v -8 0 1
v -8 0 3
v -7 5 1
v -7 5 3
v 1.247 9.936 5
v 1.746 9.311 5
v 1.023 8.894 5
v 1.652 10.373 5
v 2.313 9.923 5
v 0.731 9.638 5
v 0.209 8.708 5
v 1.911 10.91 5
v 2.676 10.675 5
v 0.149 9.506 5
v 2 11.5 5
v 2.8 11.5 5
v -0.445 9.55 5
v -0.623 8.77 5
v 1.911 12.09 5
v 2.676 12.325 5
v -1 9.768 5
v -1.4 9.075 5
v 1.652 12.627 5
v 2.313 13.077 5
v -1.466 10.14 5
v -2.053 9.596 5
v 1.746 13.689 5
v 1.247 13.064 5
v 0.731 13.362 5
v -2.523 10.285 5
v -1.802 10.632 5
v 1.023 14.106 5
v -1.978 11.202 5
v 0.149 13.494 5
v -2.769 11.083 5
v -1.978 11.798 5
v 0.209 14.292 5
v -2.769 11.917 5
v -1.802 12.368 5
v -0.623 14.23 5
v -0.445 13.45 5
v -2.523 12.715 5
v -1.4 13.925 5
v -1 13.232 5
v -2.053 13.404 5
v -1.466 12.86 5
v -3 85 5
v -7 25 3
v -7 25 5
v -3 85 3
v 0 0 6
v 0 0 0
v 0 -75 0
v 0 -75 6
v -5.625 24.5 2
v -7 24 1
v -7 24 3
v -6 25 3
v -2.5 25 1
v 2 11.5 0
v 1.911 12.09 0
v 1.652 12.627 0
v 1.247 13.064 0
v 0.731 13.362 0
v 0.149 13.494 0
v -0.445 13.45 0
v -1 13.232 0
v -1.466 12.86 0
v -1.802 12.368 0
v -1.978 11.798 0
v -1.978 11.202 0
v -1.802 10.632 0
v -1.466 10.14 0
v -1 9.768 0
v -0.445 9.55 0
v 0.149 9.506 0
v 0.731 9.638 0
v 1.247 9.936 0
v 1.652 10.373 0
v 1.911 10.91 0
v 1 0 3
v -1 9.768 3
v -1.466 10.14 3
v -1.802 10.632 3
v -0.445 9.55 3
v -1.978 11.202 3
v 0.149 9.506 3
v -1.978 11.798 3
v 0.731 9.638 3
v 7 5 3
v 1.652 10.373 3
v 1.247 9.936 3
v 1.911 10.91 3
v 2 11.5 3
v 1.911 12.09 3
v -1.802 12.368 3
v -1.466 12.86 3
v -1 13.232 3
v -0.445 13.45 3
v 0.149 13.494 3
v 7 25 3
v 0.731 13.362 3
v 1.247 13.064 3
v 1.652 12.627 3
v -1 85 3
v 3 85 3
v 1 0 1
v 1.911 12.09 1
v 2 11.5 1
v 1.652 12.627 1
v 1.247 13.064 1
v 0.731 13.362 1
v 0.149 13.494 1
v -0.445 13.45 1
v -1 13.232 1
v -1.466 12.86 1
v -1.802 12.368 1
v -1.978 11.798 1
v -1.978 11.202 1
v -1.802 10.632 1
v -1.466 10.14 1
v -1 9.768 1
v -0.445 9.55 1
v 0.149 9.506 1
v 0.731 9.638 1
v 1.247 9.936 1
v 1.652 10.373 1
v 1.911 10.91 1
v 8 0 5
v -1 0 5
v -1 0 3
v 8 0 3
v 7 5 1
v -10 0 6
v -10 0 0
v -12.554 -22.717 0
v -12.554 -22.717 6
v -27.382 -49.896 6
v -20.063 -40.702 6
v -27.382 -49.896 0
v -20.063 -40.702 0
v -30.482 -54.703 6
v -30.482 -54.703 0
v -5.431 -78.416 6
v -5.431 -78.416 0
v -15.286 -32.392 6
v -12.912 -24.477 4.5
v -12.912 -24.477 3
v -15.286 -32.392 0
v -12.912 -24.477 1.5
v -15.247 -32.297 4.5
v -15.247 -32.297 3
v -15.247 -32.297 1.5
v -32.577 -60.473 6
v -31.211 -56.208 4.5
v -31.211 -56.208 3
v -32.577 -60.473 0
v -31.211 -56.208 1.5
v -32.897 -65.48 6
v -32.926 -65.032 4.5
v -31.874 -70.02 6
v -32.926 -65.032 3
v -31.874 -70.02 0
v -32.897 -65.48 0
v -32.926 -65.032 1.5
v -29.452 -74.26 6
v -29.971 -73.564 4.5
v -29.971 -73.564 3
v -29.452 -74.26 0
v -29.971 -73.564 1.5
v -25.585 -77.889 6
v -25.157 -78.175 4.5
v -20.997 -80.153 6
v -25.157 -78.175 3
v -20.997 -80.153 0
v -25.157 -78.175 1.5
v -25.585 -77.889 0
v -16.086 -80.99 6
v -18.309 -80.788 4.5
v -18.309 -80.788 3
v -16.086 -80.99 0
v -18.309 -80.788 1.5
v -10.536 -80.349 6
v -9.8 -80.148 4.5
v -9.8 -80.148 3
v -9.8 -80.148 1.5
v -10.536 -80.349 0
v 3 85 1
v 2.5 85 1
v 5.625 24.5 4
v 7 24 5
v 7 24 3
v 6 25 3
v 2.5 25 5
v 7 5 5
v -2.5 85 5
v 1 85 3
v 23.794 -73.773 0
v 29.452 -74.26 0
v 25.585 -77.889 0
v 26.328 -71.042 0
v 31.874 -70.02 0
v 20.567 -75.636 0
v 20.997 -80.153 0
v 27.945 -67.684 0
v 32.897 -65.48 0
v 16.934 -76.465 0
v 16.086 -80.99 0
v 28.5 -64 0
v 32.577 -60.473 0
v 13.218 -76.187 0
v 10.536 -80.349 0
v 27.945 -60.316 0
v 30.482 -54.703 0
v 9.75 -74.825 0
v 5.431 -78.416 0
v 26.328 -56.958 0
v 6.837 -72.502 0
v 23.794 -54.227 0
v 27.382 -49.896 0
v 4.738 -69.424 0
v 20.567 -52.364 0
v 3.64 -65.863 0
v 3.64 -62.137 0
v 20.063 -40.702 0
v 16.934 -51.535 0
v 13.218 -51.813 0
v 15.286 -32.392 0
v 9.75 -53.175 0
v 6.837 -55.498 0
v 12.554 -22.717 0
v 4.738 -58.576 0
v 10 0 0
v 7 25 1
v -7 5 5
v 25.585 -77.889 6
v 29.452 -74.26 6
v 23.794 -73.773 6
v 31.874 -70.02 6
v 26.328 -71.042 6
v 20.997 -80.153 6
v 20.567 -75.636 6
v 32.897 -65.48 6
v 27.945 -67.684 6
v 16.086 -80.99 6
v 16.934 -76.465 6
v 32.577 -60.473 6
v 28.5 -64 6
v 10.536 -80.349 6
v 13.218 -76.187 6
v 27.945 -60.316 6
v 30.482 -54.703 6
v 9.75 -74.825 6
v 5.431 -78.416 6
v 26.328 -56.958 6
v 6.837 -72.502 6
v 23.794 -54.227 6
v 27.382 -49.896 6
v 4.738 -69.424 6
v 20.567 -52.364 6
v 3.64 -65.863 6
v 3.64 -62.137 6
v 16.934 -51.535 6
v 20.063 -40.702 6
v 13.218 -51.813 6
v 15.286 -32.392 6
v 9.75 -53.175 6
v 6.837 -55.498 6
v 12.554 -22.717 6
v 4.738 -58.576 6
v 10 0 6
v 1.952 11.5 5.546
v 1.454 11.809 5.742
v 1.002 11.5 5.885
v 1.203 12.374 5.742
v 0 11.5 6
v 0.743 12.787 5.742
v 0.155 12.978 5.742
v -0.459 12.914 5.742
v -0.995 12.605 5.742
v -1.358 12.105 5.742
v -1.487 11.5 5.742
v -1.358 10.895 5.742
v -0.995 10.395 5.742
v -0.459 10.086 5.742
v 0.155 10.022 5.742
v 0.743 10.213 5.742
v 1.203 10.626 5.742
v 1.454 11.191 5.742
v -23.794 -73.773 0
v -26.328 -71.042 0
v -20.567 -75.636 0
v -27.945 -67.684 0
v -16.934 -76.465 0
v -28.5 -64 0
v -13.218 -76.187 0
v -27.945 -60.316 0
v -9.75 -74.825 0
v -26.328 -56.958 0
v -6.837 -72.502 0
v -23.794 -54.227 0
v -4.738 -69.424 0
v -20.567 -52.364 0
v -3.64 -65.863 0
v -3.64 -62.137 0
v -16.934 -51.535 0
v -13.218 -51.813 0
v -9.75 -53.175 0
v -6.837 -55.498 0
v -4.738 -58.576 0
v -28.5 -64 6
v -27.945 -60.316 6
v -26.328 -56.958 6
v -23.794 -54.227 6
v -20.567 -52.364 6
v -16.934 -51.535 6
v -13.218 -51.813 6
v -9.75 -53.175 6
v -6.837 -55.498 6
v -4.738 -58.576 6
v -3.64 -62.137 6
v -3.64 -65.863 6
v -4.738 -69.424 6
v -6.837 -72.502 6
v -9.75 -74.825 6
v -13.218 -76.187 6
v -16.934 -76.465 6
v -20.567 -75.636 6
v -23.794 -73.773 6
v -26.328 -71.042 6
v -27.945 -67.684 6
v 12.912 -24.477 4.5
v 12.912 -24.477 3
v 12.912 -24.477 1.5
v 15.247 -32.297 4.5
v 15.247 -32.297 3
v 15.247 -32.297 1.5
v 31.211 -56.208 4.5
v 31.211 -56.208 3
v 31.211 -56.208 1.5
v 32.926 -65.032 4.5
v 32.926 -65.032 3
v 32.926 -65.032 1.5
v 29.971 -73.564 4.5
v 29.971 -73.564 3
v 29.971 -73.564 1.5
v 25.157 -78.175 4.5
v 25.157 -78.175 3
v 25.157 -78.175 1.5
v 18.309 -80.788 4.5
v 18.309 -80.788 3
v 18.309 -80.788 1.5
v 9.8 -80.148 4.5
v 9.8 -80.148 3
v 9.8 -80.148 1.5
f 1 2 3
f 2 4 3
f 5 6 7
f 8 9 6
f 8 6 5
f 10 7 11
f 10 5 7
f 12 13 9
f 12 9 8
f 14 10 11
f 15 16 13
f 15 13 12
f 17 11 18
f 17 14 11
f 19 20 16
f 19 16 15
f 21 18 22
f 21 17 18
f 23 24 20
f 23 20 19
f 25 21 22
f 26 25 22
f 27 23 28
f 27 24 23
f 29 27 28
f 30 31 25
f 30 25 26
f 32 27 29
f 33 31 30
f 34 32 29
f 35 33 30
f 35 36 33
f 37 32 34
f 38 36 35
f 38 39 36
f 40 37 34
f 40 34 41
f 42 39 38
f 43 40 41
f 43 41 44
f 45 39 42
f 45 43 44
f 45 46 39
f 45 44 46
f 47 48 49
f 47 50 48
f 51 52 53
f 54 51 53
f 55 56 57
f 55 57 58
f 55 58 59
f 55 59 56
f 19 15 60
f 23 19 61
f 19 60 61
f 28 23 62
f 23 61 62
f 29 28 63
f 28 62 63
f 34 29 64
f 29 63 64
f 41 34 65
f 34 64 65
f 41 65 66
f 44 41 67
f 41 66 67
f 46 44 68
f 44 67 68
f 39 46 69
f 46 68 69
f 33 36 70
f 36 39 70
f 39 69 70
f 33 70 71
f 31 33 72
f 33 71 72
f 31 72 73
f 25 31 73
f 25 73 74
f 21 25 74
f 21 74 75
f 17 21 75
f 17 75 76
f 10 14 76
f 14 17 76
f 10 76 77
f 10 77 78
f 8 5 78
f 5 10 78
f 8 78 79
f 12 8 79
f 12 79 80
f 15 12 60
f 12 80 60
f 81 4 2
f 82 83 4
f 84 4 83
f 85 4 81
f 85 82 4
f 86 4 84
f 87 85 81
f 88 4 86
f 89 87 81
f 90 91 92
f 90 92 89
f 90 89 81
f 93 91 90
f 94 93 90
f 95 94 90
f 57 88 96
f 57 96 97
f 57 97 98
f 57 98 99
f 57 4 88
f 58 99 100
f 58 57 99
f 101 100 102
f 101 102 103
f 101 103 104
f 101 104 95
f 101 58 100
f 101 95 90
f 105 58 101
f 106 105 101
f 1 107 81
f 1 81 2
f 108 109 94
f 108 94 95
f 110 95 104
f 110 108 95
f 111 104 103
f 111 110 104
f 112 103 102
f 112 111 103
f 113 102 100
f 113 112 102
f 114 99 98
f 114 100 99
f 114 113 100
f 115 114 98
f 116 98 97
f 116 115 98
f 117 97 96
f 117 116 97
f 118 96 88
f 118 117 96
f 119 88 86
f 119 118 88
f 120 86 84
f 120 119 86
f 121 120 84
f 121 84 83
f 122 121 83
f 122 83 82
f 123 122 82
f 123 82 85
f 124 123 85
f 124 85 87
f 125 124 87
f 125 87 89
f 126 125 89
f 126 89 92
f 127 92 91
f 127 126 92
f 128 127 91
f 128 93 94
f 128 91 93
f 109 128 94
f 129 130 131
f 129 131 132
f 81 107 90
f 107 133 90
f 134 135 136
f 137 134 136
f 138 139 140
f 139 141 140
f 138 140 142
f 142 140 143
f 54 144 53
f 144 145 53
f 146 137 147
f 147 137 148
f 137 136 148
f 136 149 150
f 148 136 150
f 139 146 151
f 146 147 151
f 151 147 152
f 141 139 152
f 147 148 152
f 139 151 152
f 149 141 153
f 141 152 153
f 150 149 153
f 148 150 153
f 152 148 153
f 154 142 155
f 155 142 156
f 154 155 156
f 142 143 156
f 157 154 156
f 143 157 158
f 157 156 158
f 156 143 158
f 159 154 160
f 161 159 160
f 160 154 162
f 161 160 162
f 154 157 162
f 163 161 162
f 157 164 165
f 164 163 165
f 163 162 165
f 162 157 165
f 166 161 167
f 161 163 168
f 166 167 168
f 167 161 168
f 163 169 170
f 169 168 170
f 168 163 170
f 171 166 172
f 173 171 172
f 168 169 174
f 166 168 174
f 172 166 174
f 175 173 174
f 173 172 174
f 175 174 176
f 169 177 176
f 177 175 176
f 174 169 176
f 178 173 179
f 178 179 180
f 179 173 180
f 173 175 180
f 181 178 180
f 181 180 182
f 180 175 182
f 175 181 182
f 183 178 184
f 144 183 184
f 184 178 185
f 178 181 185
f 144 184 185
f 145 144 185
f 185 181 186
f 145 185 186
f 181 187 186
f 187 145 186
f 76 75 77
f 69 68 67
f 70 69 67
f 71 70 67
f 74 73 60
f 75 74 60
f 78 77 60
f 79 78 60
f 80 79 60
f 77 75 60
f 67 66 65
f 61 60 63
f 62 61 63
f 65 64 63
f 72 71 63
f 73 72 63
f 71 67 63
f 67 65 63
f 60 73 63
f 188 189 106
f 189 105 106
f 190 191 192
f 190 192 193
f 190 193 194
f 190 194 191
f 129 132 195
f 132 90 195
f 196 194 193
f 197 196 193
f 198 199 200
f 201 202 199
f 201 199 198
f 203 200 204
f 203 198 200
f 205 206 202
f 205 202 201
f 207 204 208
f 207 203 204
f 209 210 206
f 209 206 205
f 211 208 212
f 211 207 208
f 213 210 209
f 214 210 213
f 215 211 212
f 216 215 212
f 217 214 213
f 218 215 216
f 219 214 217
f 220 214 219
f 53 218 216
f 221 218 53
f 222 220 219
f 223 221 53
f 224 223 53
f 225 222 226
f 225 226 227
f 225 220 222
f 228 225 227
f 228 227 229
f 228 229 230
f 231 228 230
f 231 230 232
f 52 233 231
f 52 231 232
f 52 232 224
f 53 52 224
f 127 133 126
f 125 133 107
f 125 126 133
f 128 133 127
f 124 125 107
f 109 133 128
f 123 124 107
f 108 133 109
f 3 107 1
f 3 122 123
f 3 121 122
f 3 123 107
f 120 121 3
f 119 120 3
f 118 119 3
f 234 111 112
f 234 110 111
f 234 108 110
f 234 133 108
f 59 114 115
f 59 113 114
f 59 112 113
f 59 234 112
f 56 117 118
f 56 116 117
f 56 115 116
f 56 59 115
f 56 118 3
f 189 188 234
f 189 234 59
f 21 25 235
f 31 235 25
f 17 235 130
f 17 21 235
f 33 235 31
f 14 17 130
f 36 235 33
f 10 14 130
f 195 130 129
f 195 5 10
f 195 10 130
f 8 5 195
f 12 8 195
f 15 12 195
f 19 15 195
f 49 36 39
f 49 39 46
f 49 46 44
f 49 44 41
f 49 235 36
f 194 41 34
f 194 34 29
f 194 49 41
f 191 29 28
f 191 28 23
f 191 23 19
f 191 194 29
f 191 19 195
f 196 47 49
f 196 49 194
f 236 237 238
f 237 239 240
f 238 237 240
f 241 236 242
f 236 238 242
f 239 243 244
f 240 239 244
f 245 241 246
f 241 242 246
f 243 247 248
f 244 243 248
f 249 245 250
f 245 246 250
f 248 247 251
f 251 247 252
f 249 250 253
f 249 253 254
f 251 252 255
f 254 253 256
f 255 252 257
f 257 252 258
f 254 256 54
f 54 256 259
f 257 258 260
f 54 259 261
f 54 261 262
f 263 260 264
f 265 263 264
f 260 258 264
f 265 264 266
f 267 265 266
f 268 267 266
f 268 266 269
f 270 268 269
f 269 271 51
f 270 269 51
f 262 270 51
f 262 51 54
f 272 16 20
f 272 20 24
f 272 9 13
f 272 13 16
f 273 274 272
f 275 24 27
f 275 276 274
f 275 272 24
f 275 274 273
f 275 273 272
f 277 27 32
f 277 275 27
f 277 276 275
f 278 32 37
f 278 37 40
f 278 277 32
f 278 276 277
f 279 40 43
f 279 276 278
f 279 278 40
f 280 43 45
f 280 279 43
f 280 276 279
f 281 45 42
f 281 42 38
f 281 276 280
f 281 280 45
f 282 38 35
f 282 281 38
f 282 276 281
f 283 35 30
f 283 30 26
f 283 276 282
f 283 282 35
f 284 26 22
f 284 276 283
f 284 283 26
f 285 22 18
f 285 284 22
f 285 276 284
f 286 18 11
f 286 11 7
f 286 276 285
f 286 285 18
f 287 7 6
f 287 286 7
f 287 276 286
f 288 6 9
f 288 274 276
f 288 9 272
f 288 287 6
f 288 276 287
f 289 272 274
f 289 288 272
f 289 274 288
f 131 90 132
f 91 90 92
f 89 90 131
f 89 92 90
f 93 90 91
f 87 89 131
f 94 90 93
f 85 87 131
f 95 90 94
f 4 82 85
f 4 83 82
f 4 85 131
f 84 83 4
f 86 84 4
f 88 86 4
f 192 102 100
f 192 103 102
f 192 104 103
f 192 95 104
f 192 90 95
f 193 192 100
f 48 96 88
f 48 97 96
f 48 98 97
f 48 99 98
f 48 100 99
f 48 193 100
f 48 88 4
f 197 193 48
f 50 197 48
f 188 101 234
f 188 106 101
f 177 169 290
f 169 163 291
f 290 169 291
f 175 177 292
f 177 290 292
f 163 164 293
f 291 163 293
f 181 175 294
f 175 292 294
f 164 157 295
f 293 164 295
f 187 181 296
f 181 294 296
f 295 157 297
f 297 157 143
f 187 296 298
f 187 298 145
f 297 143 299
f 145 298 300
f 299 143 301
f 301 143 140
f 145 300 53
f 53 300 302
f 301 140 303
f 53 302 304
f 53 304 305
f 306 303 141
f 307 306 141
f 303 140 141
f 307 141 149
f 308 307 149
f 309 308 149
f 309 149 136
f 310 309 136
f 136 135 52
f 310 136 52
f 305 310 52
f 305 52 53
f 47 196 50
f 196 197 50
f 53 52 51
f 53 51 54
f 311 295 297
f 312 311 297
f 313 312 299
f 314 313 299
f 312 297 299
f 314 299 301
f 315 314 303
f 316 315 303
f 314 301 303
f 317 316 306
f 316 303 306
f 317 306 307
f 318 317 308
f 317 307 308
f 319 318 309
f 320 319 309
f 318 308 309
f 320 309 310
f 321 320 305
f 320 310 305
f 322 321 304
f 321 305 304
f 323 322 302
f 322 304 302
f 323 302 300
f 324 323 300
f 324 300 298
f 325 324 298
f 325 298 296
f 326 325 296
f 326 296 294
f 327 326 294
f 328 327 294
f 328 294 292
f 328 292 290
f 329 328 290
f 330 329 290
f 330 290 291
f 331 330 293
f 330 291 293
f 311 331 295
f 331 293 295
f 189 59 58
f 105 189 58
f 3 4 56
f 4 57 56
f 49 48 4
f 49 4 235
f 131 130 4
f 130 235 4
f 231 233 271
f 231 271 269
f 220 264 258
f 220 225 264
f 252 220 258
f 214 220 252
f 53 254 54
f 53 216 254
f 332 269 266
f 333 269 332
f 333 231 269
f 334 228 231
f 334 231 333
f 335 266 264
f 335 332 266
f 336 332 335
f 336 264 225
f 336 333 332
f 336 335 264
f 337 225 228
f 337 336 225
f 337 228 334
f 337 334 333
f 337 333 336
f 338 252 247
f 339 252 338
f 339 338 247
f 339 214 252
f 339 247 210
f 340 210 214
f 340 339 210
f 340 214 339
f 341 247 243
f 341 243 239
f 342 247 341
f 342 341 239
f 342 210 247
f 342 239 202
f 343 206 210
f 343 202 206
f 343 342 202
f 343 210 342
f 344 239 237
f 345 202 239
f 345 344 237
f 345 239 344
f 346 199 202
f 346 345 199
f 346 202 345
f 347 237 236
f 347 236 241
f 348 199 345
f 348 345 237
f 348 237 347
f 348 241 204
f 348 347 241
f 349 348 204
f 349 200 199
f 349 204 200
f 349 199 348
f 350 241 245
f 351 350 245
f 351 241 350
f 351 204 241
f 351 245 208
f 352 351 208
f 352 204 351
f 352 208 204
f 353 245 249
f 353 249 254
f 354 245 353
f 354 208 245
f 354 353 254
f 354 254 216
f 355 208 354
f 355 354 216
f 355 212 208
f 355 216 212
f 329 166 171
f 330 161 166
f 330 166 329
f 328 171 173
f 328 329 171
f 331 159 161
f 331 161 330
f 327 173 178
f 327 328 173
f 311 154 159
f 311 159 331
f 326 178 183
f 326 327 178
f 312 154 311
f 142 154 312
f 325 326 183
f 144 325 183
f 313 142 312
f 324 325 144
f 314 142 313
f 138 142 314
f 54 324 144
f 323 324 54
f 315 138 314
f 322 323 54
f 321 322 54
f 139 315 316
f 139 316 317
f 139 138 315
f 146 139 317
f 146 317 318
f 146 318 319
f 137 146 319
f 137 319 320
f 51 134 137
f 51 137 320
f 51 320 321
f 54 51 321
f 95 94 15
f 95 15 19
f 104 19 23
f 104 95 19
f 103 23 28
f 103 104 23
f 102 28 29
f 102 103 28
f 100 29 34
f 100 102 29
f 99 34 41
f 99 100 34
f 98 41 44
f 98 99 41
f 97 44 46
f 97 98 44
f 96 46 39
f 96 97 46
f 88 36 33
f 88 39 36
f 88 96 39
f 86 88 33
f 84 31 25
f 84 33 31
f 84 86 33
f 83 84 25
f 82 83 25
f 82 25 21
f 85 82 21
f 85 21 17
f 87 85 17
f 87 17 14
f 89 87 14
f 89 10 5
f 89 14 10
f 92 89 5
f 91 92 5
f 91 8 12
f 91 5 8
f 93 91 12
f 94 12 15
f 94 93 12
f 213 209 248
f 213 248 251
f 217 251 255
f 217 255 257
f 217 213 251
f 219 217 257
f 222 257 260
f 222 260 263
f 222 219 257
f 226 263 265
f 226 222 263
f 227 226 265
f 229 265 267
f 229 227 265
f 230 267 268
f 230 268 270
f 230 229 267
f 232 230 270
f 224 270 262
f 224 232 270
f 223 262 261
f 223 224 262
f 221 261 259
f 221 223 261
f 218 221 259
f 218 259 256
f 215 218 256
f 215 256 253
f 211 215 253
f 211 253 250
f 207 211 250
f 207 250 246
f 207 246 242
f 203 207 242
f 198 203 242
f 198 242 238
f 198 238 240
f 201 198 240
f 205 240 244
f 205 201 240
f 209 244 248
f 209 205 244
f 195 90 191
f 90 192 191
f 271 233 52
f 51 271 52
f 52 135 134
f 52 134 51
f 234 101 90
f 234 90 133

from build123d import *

# Parameters (mm, degrees)
F1_DEPTH   = 6
F2_R       = 12.5
F3_DEPTH   = 6
F12_W      = 9
F12_H      = 2
F13_W      = 14
F13_H      = 2
F17_W      = 14
F17_H      = 2
F20_FACE_W = 14
F20_FACE_H = 2
F23_ANGLE  = 180
F24_R      = 2
F25_DEPTH  = 5.5


with BuildPart() as f1:
    # F0 (on Top) → F1 (new body)
    with BuildSketch(Plane.XY):
        with BuildLine():
            add(Edge.make_bspline(
                [(10, 0), (11.5989848037, -21.7203960732), (14.551794516, -37.2840041084), (33.7173695123, -54.7088770026), (33.6899893736, -76.726959724), (13.7604479388, -85.4259035728), (0, -75)],
                knots=[0, 0, 0, 0, 0.3055877393, 0.5313877422, 0.7339704157, 1, 1, 1, 1], degree=3))
            Line((10, 0), (0, 0))
            Line((0, 0), (0, -75))
        make_face()
    extrude(amount=F1_DEPTH)


with BuildPart() as f3:
    # F2 (on Top) → F3 (new body)
    with BuildSketch(Plane.XY):
        with Locations((16, -64)):
            Circle(F2_R)
    extrude(amount=F3_DEPTH)


with BuildPart() as f1_1:
    add(f1.part)

    # F4: cut F3
    add(f3.part, mode=Mode.SUBTRACT)


with BuildPart() as f5_1:
    # F5: instance of F1
    add(f1_1.part.mirror(Plane.YZ))


with BuildPart() as f18:
    # F12 (on Front) → F18 section 0
    with BuildSketch(Plane.XZ):
        with Locations((3.5, 4)):
            Rectangle(F12_W, F12_H)
    # F13 (on offset) → F18 section 1
    with BuildSketch(Plane.XZ.offset(-5)):
        with Locations((0, 4)):
            Rectangle(F13_W, F13_H)
    loft()

    # F13 (on offset) → F20 section 0
    with BuildSketch(Plane.XZ.offset(-5)):
        with Locations((0, 4)):
            Rectangle(F13_W, F13_H)
    # F17 (on offset) → F20 section 1
    with BuildSketch(Plane.XZ.offset(-24)):
        with Locations((0, 4)):
            Rectangle(F17_W, F17_H)
    loft()

    # F20_face (on face) → F21 section 0
    with BuildSketch(Plane(origin=(0, 24, 4), x_dir=(-1, 0, 0), z_dir=(0, 1, 0))):
        Rectangle(F20_FACE_W, F20_FACE_H)
    # F16 (on offset) → F21 section 1
    with BuildSketch(Plane.XZ.offset(-25)):
        Polygon((-7, 5), (-7, 3), (6, 3), (2.500016833, 5), align=None)
    loft()

    # F21_face (on face) → F22 section 0
    with BuildSketch(Plane(origin=(-1.3296258917, 25, 3.9481484363), x_dir=(-1, 0, 0), z_dir=(0, 1, 0))):
        Polygon((-3.8296427247, 1.0518515637), (-7.3296258917, -0.9481484363), (5.6703741083, -0.9481484363), (5.6703741083, 1.0518515637), align=None)
    # F14 (on offset) → F22 section 1
    with BuildSketch(Plane.XZ.offset(-85)):
        Polygon((0.999983167, 3), (-2.5, 5), (-3, 5), (-3, 3), align=None)
    loft()


with BuildPart() as f23_1:
    # F23: copy of F18
    add(f18.part.rotate(Axis((0, 45, 3), (0, 1, 0)), F23_ANGLE))


with BuildPart() as f25:
    # F24 (on Top) → F25 (new body)
    with BuildSketch(Plane.XY):
        with Locations((0, 11.5)):
            Circle(F24_R)
    extrude(amount=F25_DEPTH)


with BuildPart() as f18_1:
    add(f18.part)

    # F26: cut F25
    add(f25.part, mode=Mode.SUBTRACT)


with BuildPart() as f23_1_1:
    add(f23_1.part)

    # F26: cut F25
    add(f25.part, mode=Mode.SUBTRACT)


with BuildPart() as f25_1:
    add(f25.part)

    # F28 (on offset) → F29 (revolve)
    with BuildSketch(Plane.XZ.offset(-11.5)):
        with BuildLine():
            Line((0, 5), (2.8, 5))
            ThreePointArc((2.8, 5), (1.4866068747, 5.7424992492), (0, 6))
            Line((0, 6), (0, 5))
        make_face()
    revolve(axis=Axis((0, 11.5, 5.5), (0, 0, 1)))


solid = Compound([f1_1.part, f5_1.part, f18_1.part, f23_1_1.part, f25_1.part])
